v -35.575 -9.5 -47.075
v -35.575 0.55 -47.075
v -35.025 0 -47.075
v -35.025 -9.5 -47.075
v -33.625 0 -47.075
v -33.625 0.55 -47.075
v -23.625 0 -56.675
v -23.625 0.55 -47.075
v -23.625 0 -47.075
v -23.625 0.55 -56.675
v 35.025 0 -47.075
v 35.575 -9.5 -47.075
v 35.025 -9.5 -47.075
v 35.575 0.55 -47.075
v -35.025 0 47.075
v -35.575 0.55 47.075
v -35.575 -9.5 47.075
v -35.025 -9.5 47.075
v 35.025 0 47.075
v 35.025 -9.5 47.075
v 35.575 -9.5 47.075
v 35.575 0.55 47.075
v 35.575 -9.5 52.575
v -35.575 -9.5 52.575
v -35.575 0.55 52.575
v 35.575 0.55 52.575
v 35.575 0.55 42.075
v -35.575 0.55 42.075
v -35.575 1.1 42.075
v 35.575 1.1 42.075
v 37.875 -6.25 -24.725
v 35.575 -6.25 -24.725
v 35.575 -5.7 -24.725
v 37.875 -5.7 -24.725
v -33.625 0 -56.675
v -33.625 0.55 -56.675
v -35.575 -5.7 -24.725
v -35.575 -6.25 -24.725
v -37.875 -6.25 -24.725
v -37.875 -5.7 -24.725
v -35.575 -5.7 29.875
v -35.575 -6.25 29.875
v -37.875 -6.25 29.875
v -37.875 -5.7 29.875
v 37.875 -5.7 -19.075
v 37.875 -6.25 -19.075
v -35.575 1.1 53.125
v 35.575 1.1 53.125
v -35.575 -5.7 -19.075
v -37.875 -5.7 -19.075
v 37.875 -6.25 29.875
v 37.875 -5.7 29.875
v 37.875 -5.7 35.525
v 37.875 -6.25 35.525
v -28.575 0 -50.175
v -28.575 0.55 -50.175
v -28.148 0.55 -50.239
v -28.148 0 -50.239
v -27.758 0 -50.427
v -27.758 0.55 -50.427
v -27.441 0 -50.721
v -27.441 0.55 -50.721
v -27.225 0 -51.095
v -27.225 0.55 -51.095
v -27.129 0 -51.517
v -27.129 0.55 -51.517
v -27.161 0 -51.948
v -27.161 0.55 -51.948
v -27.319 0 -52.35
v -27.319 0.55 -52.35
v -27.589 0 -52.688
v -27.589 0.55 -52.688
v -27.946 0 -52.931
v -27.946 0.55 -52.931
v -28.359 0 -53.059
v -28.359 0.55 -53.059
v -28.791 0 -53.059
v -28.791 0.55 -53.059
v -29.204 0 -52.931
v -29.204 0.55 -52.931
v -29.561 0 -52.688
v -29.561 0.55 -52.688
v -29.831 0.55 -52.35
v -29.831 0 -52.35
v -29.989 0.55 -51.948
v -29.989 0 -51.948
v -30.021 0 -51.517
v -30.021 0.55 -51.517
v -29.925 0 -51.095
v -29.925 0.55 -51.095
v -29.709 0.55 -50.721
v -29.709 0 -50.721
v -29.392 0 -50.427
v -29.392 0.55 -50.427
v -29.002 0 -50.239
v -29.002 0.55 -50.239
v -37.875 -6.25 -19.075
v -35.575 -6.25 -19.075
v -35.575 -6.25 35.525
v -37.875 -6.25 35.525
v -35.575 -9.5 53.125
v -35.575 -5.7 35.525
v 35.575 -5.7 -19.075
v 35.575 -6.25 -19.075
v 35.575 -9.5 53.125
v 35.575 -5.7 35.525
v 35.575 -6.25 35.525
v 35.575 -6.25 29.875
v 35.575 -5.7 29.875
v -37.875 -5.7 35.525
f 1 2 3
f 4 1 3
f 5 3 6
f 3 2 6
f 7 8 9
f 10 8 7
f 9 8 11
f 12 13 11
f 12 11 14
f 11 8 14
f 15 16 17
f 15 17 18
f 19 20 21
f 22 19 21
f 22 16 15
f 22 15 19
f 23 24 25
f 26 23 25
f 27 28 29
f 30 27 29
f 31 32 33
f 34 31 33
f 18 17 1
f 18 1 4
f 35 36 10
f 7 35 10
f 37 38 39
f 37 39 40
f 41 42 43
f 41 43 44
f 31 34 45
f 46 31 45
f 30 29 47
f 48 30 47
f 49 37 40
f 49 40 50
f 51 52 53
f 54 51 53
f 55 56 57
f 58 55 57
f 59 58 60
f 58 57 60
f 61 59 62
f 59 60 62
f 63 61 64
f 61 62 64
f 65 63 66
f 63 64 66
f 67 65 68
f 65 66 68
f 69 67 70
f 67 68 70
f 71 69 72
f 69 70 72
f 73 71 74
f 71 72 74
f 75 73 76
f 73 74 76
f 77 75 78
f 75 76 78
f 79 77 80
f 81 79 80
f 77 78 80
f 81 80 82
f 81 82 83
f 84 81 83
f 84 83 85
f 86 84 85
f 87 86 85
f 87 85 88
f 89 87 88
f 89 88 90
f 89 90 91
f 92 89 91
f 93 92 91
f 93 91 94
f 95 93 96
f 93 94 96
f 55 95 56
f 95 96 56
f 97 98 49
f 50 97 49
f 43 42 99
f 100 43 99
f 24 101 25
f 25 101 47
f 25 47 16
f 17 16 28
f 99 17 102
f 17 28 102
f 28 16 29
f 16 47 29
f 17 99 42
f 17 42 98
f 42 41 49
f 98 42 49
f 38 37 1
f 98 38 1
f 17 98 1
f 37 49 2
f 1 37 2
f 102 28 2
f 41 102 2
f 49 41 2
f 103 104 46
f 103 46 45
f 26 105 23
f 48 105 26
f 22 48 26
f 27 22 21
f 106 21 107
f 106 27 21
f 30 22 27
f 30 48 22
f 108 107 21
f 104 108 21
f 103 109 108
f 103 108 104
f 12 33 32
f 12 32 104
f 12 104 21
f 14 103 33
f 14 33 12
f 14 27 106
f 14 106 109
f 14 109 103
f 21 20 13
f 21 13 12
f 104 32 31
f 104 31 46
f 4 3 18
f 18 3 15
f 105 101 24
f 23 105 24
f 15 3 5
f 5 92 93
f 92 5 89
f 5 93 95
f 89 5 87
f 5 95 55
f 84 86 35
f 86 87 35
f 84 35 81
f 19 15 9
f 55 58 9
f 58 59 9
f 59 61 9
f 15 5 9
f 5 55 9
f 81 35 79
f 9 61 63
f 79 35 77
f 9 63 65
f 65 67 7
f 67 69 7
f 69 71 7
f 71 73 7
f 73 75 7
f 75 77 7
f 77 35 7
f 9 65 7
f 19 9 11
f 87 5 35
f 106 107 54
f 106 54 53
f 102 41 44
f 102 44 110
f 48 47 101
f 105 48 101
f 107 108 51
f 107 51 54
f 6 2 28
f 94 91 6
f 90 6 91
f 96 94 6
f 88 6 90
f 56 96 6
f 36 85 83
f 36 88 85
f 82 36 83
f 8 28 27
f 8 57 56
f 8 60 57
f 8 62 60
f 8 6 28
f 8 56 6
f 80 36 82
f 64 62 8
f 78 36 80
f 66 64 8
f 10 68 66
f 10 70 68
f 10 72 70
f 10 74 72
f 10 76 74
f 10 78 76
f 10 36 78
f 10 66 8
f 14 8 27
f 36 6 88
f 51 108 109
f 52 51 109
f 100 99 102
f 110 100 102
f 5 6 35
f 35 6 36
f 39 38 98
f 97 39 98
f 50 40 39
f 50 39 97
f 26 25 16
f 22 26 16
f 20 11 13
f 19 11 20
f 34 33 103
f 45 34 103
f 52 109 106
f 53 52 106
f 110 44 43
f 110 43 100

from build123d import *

# Parameters (mm, degrees)
SKETCH_1_W          = 71.15
SKETCH_1_H          = 94.15
EXTRUDE_1_DEPTH     = 0.55
SKETCH_2_W          = 0.55
SKETCH_2_H          = 94.15
EXTRUDE_2_DEPTH     = 9.5
SKETCH_3_W          = 10
SKETCH_3_H          = 9.6
EXTRUDE_3_DEPTH     = 0.55
SKETCH_4_R          = 1.45
CUT_EXTRUDE_1_DEPTH = 0.55
EXTRUDE_4_DEPTH     = 71.15
SKETCH_6_W          = 5.65
SKETCH_6_H          = 0.55
EXTRUDE_5_DEPTH     = 2.3


with BuildPart() as part:
    # Эскиз1 → Бобышка-Вытянуть1 (new body)
    with BuildSketch(Plane(origin=(0, 0, 0), x_dir=(1, 0, 0), z_dir=(0, 1, 0))):
        Rectangle(SKETCH_1_W, SKETCH_1_H)
    extrude(amount=EXTRUDE_1_DEPTH)

    # Эскиз2 → Бобышка-Вытянуть2 (add)
    with BuildSketch(Plane.XZ):
        with Locations((-35.3, 0)):
            Rectangle(SKETCH_2_W, SKETCH_2_H)
        with Locations((35.3, 0)):
            Rectangle(SKETCH_2_W, SKETCH_2_H)
    extrude(amount=EXTRUDE_2_DEPTH)

    # Эскиз3 → Бобышка-Вытянуть3 (add)
    with BuildSketch(Plane(origin=(0, 0.55, 0), x_dir=(1, 0, 0), z_dir=(0, 1, 0))):
        with Locations((-28.625, 51.875)):
            Rectangle(SKETCH_3_W, SKETCH_3_H)
    extrude(amount=-EXTRUDE_3_DEPTH)

    # Эскиз4 → Вырез-Вытянуть1 (cut)
    with BuildSketch(Plane(origin=(0, 0.55, 0), x_dir=(1, 0, 0), z_dir=(0, 1, 0))):
        with Locations(Location((-28.575, 51.625, 0), (0, 0, 270))):
            Circle(SKETCH_4_R)
    extrude(amount=-CUT_EXTRUDE_1_DEPTH, mode=Mode.SUBTRACT)

    # Эскиз5 → Бобышка-Вытянуть4 (add)
    with BuildSketch(Plane.ZY.offset(35.575)):
        Polygon((42.075, 0.55), (42.075, 1.1), (53.125, 1.1), (53.125, -9.5), (52.575, -9.5), (52.575, 0.55), align=None)
    extrude(amount=-EXTRUDE_4_DEPTH)

    # Эскиз6 → Бобышка-Вытянуть5 (add)
    with BuildSketch(Plane.ZY.offset(35.575)):
        with Locations((-21.9, -5.975)):
            Rectangle(SKETCH_6_W, SKETCH_6_H)
        with Locations((32.7, -5.975)):
            Rectangle(SKETCH_6_W, SKETCH_6_H)
    extrude_5 = extrude(amount=EXTRUDE_5_DEPTH)

    # Зеркальное отражение1: Бобышка-Вытянуть5 across plane
    add(extrude_5.mirror(Plane(origin=(0, 0, 0), x_dir=(0, 0, 1), z_dir=(1, 0, 0))))


solid = part.part
